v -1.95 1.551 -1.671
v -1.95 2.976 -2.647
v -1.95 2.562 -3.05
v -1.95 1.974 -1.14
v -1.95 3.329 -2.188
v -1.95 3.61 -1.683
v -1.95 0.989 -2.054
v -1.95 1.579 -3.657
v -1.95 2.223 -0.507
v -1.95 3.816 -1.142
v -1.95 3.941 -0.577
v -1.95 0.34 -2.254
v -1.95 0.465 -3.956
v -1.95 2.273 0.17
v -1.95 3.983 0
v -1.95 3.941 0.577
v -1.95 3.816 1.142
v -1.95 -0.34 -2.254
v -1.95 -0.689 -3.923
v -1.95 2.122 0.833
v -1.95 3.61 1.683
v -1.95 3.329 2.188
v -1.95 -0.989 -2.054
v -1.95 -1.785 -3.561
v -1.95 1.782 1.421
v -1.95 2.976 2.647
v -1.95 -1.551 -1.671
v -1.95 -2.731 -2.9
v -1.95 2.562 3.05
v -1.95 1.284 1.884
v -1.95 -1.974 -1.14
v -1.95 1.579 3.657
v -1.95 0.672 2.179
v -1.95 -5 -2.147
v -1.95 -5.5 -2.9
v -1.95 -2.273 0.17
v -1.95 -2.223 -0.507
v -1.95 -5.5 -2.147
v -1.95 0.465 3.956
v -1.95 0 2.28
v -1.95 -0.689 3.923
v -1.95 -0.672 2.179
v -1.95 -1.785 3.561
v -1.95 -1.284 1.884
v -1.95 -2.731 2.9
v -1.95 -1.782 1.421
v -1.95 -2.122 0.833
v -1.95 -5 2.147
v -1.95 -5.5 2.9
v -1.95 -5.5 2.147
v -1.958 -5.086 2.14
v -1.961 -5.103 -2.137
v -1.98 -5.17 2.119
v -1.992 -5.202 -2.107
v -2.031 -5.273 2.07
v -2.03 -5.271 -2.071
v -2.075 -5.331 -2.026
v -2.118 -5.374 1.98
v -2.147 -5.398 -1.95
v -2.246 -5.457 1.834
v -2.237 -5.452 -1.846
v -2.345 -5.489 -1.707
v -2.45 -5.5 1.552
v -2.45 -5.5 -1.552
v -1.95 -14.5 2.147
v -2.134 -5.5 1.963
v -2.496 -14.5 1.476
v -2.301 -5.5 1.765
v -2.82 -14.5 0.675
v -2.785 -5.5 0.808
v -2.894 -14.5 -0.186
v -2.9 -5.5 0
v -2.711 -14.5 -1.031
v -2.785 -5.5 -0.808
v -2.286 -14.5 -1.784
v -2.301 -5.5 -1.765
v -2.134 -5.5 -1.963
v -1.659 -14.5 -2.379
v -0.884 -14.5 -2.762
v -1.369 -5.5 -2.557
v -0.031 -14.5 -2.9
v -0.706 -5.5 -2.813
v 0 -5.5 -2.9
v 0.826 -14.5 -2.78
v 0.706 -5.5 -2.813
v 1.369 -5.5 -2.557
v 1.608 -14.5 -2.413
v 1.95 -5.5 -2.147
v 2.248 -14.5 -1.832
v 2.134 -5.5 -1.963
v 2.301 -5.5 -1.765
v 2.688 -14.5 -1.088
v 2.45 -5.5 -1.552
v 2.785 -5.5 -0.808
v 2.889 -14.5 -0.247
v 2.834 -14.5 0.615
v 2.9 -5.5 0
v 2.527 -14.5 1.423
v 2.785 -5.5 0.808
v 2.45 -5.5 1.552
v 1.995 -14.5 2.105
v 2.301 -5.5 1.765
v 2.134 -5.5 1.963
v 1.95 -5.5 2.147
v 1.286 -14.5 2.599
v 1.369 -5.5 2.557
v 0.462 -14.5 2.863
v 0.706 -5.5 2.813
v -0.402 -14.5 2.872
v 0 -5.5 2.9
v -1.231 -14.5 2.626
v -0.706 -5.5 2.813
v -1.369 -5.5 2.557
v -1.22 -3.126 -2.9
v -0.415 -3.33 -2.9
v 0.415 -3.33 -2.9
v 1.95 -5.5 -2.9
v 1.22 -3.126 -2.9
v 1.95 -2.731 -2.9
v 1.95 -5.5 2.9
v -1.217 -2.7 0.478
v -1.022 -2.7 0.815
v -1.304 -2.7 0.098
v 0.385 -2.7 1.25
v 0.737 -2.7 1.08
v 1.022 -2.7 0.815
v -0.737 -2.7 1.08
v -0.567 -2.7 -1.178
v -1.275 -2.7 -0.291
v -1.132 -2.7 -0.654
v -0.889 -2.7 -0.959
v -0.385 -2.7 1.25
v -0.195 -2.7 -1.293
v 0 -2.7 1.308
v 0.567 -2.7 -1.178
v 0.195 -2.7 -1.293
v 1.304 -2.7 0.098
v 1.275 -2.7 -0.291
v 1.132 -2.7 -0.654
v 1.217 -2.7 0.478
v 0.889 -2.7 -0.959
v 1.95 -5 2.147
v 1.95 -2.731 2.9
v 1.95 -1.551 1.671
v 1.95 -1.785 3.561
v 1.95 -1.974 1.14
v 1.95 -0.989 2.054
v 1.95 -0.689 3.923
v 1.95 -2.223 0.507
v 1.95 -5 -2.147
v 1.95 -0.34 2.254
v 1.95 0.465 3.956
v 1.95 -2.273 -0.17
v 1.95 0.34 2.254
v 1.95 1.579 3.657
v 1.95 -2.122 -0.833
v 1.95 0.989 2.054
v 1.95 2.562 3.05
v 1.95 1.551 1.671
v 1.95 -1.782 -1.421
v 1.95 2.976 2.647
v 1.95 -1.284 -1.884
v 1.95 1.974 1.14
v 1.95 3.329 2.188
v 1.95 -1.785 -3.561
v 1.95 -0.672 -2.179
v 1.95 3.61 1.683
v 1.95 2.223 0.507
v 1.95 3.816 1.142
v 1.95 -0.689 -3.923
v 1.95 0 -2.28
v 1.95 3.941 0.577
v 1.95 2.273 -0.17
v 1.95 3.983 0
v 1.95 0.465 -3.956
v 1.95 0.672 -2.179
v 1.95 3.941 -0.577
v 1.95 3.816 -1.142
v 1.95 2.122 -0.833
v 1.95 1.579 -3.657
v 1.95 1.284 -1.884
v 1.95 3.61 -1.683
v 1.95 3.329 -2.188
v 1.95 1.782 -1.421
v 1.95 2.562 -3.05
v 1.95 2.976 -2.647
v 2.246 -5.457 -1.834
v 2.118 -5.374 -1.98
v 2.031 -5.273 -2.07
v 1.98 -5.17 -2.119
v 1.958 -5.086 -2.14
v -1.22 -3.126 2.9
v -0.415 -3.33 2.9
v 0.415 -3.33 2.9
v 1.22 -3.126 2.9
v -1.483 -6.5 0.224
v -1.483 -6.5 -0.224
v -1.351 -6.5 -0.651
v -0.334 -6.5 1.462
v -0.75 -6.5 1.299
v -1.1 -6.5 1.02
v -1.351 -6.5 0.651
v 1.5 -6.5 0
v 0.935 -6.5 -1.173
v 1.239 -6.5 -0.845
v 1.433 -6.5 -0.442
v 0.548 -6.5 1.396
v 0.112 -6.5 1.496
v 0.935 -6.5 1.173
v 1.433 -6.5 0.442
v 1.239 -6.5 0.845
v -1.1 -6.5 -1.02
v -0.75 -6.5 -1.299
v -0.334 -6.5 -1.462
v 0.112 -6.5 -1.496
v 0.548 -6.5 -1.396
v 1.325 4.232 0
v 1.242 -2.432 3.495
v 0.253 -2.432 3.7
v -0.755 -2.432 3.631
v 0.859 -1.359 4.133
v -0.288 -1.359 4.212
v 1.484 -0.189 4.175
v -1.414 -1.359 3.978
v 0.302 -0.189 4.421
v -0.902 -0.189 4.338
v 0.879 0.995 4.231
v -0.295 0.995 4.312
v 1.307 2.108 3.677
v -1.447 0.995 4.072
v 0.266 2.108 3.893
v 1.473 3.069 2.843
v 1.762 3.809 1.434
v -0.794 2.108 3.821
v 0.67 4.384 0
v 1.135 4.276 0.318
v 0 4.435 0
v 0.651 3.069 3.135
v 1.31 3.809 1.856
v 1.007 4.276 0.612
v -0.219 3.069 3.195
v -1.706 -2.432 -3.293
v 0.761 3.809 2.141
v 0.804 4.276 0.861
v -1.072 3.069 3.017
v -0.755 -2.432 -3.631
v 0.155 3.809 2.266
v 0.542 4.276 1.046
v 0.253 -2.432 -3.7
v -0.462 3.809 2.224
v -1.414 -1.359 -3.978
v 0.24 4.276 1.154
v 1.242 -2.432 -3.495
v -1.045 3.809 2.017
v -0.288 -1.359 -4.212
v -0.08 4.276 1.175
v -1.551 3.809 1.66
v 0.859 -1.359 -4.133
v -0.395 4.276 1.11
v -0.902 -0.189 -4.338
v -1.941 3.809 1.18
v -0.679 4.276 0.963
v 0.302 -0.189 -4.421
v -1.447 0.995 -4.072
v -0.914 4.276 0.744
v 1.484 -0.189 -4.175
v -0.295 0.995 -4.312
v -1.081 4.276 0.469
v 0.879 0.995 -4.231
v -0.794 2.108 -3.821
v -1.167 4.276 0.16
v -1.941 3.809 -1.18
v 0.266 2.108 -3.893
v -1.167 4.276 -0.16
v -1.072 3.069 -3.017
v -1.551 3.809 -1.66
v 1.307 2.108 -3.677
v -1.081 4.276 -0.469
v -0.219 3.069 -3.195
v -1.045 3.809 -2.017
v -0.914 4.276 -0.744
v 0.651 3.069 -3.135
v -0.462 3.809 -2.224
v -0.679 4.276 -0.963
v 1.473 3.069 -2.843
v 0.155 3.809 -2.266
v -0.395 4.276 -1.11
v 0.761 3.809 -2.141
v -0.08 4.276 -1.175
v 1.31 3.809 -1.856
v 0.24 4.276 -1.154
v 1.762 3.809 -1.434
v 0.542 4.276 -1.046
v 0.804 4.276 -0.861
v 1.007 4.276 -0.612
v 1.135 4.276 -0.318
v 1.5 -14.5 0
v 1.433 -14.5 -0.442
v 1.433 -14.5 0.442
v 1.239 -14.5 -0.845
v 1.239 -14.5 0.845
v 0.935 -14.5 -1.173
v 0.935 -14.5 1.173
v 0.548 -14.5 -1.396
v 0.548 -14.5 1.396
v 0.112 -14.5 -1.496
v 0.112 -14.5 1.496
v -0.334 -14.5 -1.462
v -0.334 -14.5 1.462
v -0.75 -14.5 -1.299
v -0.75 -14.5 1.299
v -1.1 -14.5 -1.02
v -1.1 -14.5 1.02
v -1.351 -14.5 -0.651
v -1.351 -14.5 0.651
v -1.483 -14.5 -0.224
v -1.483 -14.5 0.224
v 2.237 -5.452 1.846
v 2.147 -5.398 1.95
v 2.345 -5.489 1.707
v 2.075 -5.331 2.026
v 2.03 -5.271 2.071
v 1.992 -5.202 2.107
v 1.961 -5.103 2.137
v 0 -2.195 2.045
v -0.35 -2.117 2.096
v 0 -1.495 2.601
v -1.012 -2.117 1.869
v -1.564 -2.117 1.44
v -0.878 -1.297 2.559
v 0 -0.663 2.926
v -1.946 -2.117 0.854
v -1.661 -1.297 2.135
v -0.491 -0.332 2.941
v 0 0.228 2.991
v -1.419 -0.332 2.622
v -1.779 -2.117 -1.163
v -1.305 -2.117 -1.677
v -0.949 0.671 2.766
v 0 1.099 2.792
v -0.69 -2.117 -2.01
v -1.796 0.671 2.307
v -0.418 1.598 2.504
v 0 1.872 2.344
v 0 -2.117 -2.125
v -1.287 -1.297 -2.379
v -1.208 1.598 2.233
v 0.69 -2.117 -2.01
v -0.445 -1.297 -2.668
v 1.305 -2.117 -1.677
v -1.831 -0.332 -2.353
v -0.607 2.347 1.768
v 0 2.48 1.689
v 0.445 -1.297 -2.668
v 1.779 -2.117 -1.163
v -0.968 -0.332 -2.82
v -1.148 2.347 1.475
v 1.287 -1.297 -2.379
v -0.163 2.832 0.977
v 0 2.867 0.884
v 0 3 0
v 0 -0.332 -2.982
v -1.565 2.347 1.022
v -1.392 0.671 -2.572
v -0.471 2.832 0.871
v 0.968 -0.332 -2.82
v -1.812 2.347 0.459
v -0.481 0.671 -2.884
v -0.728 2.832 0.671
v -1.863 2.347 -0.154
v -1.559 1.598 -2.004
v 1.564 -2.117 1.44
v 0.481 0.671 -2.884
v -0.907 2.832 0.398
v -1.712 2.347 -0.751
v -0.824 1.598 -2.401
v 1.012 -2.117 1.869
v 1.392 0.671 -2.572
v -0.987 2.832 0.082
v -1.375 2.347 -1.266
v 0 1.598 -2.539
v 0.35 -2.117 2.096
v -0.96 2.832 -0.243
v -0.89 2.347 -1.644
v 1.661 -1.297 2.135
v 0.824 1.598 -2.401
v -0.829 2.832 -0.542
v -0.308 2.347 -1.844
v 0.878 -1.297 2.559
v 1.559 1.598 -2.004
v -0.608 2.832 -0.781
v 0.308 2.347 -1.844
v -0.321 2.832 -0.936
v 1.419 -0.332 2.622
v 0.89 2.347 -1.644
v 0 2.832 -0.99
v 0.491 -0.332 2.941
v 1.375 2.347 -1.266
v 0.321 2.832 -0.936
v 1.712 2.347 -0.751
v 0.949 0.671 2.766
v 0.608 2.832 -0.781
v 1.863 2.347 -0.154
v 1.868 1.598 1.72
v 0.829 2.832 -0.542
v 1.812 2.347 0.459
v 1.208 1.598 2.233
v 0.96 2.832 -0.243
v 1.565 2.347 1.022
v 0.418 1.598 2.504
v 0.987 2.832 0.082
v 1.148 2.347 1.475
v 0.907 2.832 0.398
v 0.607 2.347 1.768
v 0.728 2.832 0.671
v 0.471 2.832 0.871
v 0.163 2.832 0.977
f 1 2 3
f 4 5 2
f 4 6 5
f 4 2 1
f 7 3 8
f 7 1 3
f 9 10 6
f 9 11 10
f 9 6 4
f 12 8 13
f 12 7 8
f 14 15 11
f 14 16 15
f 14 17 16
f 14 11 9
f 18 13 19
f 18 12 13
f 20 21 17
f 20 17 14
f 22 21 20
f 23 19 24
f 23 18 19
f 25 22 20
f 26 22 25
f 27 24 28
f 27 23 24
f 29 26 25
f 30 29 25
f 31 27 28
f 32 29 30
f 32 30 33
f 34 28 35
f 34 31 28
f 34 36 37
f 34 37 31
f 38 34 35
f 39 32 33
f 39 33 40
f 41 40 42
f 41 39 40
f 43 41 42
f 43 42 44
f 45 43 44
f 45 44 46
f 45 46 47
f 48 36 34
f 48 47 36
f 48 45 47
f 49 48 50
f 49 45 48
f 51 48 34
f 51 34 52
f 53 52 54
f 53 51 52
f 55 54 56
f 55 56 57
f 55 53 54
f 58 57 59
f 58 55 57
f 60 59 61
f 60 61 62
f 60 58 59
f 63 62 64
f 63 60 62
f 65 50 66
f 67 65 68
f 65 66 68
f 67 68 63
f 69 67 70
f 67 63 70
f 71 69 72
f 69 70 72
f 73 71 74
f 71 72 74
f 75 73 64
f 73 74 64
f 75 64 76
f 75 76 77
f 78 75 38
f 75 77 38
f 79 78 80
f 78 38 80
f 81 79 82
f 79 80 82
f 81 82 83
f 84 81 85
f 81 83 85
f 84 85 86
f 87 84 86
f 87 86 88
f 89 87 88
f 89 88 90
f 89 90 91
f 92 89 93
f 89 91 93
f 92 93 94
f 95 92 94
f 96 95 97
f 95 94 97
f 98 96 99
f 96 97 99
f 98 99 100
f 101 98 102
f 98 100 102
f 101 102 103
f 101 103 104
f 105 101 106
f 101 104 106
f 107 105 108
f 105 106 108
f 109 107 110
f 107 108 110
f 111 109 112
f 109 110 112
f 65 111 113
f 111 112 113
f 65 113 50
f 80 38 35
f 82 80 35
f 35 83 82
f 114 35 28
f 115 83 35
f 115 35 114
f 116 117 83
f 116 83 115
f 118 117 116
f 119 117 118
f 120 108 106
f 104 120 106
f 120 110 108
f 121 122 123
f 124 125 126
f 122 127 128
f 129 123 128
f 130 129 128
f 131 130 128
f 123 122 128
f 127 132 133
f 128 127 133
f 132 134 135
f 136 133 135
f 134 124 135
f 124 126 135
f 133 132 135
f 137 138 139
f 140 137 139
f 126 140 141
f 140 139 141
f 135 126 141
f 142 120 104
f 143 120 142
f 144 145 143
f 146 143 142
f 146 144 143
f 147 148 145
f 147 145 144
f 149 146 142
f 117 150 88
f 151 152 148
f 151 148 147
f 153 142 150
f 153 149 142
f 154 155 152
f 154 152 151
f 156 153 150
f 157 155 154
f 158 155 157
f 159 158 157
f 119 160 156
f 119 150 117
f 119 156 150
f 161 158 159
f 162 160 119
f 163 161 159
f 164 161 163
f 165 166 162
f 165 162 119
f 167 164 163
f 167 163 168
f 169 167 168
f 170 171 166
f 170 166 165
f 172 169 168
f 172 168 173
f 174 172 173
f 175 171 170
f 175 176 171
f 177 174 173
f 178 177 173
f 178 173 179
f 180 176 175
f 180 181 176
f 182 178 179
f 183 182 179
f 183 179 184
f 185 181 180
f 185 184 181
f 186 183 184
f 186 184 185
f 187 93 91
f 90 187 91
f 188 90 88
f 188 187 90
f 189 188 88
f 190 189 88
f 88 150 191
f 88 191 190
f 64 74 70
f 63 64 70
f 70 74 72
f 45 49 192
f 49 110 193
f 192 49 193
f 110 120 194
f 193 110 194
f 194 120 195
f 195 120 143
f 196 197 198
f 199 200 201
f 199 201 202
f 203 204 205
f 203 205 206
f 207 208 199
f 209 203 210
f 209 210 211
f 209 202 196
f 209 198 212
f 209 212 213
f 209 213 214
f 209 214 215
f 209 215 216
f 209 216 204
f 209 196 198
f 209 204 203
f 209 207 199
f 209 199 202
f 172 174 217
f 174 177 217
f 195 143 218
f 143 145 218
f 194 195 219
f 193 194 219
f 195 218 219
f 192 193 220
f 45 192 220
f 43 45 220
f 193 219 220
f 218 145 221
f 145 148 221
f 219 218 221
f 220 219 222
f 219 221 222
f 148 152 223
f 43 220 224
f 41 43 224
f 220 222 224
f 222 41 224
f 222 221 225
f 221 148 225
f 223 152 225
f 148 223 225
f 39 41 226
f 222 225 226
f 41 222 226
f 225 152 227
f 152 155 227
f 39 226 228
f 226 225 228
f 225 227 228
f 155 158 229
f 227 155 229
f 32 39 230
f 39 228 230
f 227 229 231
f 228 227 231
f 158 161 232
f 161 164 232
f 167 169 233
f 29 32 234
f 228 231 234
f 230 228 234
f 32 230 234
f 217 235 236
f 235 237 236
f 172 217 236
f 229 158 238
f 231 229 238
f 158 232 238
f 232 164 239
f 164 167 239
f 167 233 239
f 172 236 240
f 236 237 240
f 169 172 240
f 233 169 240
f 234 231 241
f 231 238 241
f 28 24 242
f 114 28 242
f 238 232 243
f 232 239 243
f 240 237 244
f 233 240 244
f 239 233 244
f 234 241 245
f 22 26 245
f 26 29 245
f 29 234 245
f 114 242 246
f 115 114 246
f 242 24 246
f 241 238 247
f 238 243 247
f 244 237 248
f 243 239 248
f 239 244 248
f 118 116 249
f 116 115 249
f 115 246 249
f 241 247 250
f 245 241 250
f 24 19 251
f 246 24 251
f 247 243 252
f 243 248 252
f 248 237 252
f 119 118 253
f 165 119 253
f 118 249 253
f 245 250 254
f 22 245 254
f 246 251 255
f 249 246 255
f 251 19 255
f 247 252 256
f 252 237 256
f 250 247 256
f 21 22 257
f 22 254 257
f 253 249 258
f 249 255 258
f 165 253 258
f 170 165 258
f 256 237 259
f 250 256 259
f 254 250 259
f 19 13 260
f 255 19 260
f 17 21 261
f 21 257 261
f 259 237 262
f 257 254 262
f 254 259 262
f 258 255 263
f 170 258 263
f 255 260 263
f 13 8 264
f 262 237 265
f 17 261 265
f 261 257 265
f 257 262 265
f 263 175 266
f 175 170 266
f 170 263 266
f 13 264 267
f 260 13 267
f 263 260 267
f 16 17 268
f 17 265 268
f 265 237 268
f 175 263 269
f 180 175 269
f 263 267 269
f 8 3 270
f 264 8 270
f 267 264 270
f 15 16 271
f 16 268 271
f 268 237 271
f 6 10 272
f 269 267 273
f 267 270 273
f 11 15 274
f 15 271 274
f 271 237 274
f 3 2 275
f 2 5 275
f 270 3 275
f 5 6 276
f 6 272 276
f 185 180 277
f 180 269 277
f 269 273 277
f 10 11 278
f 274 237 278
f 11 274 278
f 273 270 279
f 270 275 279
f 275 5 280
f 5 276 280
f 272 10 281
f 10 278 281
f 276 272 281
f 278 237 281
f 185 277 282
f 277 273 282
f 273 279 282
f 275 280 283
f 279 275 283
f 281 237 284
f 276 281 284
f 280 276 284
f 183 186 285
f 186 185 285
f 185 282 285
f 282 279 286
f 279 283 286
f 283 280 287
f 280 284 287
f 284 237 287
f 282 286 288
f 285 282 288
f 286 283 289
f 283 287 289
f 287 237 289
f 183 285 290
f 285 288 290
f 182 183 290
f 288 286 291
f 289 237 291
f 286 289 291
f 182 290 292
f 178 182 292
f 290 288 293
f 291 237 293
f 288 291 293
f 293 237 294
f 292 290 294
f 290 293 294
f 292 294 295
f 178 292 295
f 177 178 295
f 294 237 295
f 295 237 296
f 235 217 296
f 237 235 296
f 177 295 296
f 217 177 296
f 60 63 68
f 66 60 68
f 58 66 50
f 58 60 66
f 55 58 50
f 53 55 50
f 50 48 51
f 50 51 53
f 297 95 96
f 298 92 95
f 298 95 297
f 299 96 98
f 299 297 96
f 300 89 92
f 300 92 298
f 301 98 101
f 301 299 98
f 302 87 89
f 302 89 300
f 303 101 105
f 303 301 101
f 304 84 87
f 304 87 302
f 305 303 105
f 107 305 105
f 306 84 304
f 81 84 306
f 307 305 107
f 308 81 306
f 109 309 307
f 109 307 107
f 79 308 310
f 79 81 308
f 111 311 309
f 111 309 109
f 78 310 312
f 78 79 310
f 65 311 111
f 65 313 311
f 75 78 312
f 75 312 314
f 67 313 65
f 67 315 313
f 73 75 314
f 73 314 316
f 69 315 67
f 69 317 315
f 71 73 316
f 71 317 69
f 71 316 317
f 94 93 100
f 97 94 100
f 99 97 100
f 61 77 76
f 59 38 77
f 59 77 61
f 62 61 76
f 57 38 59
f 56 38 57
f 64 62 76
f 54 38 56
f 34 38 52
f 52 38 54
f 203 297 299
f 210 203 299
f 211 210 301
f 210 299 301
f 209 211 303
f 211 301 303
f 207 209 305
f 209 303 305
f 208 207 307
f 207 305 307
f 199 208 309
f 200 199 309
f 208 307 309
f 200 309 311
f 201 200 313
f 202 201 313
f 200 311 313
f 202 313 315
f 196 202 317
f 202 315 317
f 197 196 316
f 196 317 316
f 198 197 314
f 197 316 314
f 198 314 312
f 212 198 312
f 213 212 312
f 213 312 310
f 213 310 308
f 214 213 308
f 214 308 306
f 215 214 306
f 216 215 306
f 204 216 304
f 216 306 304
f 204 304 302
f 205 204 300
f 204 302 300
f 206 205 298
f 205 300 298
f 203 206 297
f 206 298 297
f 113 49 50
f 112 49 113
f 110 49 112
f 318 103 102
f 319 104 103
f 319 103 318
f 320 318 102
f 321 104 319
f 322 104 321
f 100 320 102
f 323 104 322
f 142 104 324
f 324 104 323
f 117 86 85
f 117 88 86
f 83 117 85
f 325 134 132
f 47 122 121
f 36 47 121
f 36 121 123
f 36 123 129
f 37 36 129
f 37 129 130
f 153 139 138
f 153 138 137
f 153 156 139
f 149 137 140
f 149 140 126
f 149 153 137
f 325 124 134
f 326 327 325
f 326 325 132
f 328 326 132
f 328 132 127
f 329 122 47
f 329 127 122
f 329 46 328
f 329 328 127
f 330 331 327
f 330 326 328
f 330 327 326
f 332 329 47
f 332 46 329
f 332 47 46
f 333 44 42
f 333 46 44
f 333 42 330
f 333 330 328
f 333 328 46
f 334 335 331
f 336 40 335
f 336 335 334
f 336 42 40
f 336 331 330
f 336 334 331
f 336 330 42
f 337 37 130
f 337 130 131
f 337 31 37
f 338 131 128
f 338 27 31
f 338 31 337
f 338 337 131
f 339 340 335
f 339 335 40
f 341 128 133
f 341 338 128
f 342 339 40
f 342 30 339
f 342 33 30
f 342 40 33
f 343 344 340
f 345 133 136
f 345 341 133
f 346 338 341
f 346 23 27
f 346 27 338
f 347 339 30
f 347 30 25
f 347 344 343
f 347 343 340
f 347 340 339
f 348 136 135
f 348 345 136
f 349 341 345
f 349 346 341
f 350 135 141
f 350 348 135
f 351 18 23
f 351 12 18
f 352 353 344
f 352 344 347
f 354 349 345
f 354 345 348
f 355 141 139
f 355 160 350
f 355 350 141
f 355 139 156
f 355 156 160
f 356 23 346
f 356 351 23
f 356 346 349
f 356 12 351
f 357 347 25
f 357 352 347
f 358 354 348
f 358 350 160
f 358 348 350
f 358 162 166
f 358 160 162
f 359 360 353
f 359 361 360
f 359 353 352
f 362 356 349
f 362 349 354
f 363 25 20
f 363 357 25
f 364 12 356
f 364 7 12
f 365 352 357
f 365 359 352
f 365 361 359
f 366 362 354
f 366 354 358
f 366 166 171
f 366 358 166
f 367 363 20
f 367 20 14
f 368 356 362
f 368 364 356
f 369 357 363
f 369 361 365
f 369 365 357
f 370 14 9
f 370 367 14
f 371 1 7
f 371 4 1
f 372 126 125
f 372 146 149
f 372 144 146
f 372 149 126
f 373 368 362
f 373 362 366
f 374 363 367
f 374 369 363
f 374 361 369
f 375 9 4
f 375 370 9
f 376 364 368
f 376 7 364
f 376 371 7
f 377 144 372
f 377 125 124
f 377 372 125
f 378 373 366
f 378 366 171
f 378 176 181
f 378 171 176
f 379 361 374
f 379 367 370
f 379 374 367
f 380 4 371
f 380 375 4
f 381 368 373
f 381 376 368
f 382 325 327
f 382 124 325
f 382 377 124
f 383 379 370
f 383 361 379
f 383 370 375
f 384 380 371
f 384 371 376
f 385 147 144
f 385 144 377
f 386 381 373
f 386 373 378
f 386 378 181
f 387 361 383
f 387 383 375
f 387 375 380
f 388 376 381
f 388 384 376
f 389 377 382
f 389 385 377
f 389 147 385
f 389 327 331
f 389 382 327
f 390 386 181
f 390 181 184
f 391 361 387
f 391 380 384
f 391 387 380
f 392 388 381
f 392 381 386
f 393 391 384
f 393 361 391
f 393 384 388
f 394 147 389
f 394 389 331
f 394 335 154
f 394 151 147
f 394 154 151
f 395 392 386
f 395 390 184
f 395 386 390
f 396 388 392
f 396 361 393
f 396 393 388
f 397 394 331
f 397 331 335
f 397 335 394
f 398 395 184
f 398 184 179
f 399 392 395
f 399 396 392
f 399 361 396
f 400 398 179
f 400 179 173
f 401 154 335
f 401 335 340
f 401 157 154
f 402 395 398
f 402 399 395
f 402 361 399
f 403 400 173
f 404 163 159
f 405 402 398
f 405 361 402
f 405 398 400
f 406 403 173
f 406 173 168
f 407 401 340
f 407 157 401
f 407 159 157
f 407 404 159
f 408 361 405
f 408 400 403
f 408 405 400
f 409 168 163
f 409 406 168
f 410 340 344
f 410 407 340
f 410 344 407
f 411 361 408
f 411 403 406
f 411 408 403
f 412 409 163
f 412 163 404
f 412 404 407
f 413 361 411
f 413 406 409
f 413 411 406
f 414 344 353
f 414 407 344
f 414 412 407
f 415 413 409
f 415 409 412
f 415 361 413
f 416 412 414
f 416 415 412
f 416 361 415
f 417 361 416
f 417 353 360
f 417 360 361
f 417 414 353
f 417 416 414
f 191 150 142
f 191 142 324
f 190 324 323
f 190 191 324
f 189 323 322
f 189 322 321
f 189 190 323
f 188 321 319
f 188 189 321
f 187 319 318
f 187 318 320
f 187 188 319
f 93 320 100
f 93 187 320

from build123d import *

# Parameters (mm, degrees)
CUT_EXTRUDE_1_DEPTH = 10
EXTRUDE_2_REACH     = 8.953
SKETCH_4_W          = 5.8
SKETCH_4_H          = 2.8
SKETCH_6_W          = 5.8
SKETCH_6_H          = 2.8
EXTRUDE_4_DEPTH     = 1.95
SKETCH_7_R          = 2.9
EXTRUDE_5_DEPTH     = 9
FILLET_1_R          = 0.5
SKETCH_8_R          = 1.5
CUT_EXTRUDE_2_DEPTH = 8


with BuildPart() as part:
    # 草图1 → 旋转1 (revolve)
    with BuildSketch(Plane.XY):
        with BuildLine():
            Line((0, 4.435), (0, -4.435))
            ThreePointArc((0, -4.435), (4.435, 0), (0, 4.435))
        make_face()
    revolve(axis=Axis((0, 4.435, 0), (0, -1, 0)))

    # 草图2 → 切除-拉伸1 (cut, symmetric)
    with BuildSketch(Plane.XY):
        Polygon((-1.95, 4.9314621), (-1.95, -5.561634077), (-9.481889981, 1.10646475), align=None)
        Polygon((1.95, 4.9314621), (1.95, -5.561634077), (8.441373461, -0.109913717), align=None)
    extrude(amount=CUT_EXTRUDE_1_DEPTH, both=True, mode=Mode.SUBTRACT)

    # 草图3 → 切除-旋转1 (revolve, cut)
    with BuildSketch(Plane.ZY):
        with BuildLine():
            Line((0, 3), (0, -3))
            ThreePointArc((0, -3), (3, 0), (0, 3))
        make_face()
    revolve(axis=Axis((0, 3, 0), (0, -1, 0)), mode=Mode.SUBTRACT)

    # 凸台-拉伸2: up to this face of the body (flat: up to its plane)
    extrude_2_end = Plane(part.part.faces().sort_by_distance((-1.95, 3.870640887, 0))[0])
    # 草图4 → 凸台-拉伸2 (add, up to the picked face)
    with BuildSketch(Plane.ZY, mode=Mode.PRIVATE) as extrude_2_sk1:
        with Locations((0, -4.1)):
            Rectangle(SKETCH_4_W, SKETCH_4_H)
    extrude_2_tool1 = split(extrude(extrude_2_sk1.sketch, amount=EXTRUDE_2_REACH, mode=Mode.PRIVATE), bisect_by=extrude_2_end, keep=Keep.BOTH, mode=Mode.PRIVATE)
    add(extrude_2_tool1.solids().sort_by(Axis((0, -4.1, 0), (-1, 0, 0)))[0])

    # 草图6 → 凸台-拉伸4 (add)
    with BuildSketch(Plane(origin=(1.95, 0, 0), x_dir=(0, 0, -1), z_dir=(1, 0, 0))):
        with Locations((0, -4.1)):
            Rectangle(SKETCH_6_W, SKETCH_6_H)
    extrude(amount=-EXTRUDE_4_DEPTH)

    # 草图7 → 凸台-拉伸5 (add)
    with BuildSketch(Plane.XZ.offset(5.5)):
        with Locations(Location((0, 0, 0), (0, 0, 132.253636979))):
            Circle(SKETCH_7_R)
    extrude(amount=EXTRUDE_5_DEPTH)

    # 圆角1
    # the kernel refuses this fillet: 0.5 mm, written as the material it adds along each edge
    with BuildSketch(Plane(origin=(-1.95, -5.5, 3.396508793), x_dir=(0, 1, 0), z_dir=(0, 0, -1))) as fillet_1_piece_1_section:
        with BuildLine():
            CenterArc((FILLET_1_R, -FILLET_1_R), FILLET_1_R, 90, 90)
            Line((0, -FILLET_1_R), (0, 0))
            Line((0, 0), (FILLET_1_R, 0))
        make_face()
    fillet_1_piece_1 = extrude(amount=6.793017587, mode=Mode.PRIVATE)
    fillet_1_piece_1 = fillet_1_piece_1 & Plane(origin=(0, -5.385657526, 0), x_dir=(-0.6724137930973646, 0, 0.7401754459939985), z_dir=(0, 1, 0)) * Cylinder(2.9, 16, mode=Mode.PRIVATE)
    add(fillet_1_piece_1)
    with BuildSketch(Plane(origin=(1.95, -5.5, -3.396508793), x_dir=(0, 1, 0), z_dir=(0, 0, 1))) as fillet_1_piece_2_section:
        with BuildLine():
            CenterArc((FILLET_1_R, -FILLET_1_R), FILLET_1_R, 90, 90)
            Line((0, -FILLET_1_R), (0, 0))
            Line((0, 0), (FILLET_1_R, 0))
        make_face()
    fillet_1_piece_2 = extrude(amount=6.793017587, mode=Mode.PRIVATE)
    fillet_1_piece_2 = fillet_1_piece_2 & Plane(origin=(0, -5.385657526, 0), x_dir=(-0.6724137930973646, 0, 0.7401754459939985), z_dir=(0, 1, 0)) * Cylinder(2.9, 16, mode=Mode.PRIVATE)
    add(fillet_1_piece_2)

    # 草图8 → 切除-拉伸2 (cut)
    with BuildSketch(Plane.XZ.offset(14.5)):
        Circle(SKETCH_8_R)
    extrude(amount=-CUT_EXTRUDE_2_DEPTH, mode=Mode.SUBTRACT)


solid = part.part
